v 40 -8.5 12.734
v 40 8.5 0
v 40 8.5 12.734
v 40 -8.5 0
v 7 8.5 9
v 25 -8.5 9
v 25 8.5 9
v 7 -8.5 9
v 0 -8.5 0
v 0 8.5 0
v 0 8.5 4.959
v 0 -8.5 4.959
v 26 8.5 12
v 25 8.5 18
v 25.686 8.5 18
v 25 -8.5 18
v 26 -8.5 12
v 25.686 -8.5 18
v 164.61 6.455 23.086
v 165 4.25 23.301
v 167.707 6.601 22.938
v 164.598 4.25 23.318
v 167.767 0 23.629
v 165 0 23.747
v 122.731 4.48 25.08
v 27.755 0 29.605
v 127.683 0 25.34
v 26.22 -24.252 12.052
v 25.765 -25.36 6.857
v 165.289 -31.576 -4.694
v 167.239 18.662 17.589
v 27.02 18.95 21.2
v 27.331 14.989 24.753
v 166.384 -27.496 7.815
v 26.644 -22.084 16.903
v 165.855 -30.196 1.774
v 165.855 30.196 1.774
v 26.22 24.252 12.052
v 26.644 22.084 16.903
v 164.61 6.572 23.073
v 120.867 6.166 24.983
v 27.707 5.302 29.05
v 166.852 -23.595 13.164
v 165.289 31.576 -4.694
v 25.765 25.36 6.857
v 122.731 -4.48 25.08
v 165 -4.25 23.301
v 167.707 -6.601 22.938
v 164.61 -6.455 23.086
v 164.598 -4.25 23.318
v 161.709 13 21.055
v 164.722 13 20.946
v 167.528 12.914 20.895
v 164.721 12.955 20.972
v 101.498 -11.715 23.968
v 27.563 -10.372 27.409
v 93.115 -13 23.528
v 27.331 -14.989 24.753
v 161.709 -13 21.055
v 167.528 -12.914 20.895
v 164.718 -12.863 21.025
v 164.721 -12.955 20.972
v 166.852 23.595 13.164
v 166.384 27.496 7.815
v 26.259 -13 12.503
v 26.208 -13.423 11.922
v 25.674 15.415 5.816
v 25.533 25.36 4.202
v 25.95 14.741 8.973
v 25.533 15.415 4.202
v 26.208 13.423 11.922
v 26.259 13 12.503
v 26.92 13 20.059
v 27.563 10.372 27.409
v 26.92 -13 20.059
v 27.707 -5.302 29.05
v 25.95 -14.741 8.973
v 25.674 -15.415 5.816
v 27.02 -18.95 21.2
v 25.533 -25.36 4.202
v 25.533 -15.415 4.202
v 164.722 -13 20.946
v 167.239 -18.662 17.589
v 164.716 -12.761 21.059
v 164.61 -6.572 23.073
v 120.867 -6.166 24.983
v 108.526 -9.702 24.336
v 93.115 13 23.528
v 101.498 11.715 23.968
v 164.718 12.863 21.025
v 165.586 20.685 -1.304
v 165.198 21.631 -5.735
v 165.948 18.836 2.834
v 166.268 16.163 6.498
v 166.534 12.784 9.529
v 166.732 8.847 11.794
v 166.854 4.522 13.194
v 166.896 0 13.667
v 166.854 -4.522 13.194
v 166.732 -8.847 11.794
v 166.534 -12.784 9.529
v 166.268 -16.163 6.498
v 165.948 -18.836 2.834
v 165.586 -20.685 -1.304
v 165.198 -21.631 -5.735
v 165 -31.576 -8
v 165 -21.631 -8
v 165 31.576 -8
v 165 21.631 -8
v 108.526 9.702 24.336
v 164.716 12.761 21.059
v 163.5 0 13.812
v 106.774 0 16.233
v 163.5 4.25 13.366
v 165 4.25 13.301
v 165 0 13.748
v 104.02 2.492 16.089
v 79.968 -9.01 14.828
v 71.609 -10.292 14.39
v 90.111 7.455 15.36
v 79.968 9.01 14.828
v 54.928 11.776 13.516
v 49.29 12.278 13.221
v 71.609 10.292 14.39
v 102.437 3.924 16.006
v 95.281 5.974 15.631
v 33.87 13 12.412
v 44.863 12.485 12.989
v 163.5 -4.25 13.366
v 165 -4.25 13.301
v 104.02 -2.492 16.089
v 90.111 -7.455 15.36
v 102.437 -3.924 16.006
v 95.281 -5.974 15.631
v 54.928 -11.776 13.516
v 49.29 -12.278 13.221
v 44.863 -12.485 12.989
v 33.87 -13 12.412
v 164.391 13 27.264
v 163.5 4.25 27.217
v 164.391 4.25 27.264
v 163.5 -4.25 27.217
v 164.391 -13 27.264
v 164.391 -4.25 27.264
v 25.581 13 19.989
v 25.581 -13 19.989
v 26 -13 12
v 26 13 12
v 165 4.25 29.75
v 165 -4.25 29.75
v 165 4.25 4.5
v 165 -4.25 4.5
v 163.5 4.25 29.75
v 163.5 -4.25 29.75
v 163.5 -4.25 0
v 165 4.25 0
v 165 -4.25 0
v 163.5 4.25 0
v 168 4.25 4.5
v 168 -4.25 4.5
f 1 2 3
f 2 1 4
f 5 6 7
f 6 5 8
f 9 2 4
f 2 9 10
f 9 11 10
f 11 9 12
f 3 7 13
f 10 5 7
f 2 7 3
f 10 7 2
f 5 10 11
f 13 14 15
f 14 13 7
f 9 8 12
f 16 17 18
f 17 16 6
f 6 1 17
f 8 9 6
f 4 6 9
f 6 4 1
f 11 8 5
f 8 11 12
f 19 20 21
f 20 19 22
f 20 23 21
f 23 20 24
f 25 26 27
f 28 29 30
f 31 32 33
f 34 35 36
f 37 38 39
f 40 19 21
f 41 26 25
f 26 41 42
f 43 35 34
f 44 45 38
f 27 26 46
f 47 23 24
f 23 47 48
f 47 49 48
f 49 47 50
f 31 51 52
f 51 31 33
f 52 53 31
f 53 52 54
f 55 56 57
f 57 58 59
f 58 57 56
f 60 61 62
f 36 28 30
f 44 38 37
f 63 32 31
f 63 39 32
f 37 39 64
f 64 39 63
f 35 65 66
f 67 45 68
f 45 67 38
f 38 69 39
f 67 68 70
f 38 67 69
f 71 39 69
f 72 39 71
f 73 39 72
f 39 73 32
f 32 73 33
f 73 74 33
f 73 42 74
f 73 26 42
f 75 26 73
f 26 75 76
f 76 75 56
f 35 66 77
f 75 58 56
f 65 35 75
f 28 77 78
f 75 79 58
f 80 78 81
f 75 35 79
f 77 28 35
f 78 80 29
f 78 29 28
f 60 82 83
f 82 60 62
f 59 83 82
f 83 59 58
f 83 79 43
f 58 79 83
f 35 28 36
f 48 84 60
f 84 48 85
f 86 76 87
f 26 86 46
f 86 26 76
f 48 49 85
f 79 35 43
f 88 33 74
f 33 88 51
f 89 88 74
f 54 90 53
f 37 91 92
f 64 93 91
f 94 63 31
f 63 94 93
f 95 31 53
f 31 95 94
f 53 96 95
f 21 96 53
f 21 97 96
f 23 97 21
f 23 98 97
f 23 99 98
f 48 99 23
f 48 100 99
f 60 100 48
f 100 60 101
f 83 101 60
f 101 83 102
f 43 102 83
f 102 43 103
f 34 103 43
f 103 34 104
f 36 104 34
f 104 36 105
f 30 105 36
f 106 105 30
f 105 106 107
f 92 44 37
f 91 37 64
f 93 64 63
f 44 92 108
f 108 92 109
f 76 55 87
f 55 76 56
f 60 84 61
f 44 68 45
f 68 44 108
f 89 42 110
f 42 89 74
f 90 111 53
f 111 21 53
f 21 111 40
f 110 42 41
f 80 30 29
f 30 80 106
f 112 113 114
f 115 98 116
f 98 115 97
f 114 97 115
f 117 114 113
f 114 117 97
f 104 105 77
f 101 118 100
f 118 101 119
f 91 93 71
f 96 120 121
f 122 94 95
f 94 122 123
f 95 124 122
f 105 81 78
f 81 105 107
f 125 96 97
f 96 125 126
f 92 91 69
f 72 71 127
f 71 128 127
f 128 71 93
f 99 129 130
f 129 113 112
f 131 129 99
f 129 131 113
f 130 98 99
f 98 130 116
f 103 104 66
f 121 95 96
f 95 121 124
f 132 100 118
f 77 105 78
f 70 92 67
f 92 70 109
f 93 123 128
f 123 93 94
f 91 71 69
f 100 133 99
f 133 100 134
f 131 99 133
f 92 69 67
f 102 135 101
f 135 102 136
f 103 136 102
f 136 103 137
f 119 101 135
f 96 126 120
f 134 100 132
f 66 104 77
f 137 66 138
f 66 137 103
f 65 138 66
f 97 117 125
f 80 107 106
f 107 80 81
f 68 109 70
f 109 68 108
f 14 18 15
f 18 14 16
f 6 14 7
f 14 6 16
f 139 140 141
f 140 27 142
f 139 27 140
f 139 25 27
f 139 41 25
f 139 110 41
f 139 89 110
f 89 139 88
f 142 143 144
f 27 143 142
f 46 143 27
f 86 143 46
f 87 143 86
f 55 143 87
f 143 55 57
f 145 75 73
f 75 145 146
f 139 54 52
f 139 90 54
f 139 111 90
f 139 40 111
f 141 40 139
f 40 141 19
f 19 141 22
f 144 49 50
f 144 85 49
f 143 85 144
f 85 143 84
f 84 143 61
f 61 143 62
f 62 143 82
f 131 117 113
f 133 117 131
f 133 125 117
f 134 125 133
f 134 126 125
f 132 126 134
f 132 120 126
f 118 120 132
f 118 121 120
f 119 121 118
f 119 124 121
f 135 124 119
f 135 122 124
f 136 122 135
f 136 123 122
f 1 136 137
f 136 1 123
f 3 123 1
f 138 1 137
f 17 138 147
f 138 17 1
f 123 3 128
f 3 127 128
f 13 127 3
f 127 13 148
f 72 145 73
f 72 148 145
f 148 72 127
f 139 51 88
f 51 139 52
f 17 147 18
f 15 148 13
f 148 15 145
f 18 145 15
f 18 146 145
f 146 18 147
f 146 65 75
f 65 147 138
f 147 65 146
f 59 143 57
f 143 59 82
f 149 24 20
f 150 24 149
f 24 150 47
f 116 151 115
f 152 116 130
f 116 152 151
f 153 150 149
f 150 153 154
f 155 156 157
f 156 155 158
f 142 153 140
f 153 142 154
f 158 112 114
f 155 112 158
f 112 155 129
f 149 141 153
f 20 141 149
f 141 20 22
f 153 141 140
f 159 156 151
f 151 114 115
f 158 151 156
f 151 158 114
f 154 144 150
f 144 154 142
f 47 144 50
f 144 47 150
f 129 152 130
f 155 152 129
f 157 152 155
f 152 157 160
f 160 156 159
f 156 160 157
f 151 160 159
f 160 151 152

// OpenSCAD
union() {
	difference() {
		translate(v = [0, -8.5000000000, 0]) {
			cube(size = [40, 17, 9]);
		}
		translate(v = [7, -10, 9]) {
			rotate(a = 150, v = [0, 1, 0]) {
				translate(v = [0, 0, -5]) {
					cube(size = [20, 20, 5]);
				}
			}
		}
	}
	translate(v = [25, -8.5000000000, 9]) {
		cube(size = [15, 17, 9]);
	}
	translate(v = [26, -13, 12]) {
		rotate(a = -3, v = [0, 1, 0]) {
			cube(size = [139, 26, 8]);
		}
	}
	translate(v = [163.5000000000, -4.2500000000, 0]) {
		cube(size = [1.5000000000, 8.5000000000, 29.7500000000]);
	}
	translate(v = [163.5000000000, -4.2500000000, 4.5000000000]) {
		rotate(a = -90, v = [1, 0, 0]) {
			linear_extrude(height = 8.5000000000) {
				polygon(paths = [[0, 1, 2, 3]], points = [[0, 0], [4.5000000000, 0], [1.5000000000, 4.5000000000], [0, 4.5000000000]]);
			}
		}
	}
	translate(v = [165, 0, -8]) {
		rotate(a = -85, v = [0, 1, 0]) {
			difference() {
				difference() {
					cylinder(h = 140, r1 = 31.7500000000, r2 = 25.5000000000);
					cylinder(h = 140, r1 = 21.7500000000, r2 = 15.5000000000);
				}
				translate(v = [-100, -50, 0]) {
					cube(size = [100, 100, 200]);
				}
			}
		}
	}
}
